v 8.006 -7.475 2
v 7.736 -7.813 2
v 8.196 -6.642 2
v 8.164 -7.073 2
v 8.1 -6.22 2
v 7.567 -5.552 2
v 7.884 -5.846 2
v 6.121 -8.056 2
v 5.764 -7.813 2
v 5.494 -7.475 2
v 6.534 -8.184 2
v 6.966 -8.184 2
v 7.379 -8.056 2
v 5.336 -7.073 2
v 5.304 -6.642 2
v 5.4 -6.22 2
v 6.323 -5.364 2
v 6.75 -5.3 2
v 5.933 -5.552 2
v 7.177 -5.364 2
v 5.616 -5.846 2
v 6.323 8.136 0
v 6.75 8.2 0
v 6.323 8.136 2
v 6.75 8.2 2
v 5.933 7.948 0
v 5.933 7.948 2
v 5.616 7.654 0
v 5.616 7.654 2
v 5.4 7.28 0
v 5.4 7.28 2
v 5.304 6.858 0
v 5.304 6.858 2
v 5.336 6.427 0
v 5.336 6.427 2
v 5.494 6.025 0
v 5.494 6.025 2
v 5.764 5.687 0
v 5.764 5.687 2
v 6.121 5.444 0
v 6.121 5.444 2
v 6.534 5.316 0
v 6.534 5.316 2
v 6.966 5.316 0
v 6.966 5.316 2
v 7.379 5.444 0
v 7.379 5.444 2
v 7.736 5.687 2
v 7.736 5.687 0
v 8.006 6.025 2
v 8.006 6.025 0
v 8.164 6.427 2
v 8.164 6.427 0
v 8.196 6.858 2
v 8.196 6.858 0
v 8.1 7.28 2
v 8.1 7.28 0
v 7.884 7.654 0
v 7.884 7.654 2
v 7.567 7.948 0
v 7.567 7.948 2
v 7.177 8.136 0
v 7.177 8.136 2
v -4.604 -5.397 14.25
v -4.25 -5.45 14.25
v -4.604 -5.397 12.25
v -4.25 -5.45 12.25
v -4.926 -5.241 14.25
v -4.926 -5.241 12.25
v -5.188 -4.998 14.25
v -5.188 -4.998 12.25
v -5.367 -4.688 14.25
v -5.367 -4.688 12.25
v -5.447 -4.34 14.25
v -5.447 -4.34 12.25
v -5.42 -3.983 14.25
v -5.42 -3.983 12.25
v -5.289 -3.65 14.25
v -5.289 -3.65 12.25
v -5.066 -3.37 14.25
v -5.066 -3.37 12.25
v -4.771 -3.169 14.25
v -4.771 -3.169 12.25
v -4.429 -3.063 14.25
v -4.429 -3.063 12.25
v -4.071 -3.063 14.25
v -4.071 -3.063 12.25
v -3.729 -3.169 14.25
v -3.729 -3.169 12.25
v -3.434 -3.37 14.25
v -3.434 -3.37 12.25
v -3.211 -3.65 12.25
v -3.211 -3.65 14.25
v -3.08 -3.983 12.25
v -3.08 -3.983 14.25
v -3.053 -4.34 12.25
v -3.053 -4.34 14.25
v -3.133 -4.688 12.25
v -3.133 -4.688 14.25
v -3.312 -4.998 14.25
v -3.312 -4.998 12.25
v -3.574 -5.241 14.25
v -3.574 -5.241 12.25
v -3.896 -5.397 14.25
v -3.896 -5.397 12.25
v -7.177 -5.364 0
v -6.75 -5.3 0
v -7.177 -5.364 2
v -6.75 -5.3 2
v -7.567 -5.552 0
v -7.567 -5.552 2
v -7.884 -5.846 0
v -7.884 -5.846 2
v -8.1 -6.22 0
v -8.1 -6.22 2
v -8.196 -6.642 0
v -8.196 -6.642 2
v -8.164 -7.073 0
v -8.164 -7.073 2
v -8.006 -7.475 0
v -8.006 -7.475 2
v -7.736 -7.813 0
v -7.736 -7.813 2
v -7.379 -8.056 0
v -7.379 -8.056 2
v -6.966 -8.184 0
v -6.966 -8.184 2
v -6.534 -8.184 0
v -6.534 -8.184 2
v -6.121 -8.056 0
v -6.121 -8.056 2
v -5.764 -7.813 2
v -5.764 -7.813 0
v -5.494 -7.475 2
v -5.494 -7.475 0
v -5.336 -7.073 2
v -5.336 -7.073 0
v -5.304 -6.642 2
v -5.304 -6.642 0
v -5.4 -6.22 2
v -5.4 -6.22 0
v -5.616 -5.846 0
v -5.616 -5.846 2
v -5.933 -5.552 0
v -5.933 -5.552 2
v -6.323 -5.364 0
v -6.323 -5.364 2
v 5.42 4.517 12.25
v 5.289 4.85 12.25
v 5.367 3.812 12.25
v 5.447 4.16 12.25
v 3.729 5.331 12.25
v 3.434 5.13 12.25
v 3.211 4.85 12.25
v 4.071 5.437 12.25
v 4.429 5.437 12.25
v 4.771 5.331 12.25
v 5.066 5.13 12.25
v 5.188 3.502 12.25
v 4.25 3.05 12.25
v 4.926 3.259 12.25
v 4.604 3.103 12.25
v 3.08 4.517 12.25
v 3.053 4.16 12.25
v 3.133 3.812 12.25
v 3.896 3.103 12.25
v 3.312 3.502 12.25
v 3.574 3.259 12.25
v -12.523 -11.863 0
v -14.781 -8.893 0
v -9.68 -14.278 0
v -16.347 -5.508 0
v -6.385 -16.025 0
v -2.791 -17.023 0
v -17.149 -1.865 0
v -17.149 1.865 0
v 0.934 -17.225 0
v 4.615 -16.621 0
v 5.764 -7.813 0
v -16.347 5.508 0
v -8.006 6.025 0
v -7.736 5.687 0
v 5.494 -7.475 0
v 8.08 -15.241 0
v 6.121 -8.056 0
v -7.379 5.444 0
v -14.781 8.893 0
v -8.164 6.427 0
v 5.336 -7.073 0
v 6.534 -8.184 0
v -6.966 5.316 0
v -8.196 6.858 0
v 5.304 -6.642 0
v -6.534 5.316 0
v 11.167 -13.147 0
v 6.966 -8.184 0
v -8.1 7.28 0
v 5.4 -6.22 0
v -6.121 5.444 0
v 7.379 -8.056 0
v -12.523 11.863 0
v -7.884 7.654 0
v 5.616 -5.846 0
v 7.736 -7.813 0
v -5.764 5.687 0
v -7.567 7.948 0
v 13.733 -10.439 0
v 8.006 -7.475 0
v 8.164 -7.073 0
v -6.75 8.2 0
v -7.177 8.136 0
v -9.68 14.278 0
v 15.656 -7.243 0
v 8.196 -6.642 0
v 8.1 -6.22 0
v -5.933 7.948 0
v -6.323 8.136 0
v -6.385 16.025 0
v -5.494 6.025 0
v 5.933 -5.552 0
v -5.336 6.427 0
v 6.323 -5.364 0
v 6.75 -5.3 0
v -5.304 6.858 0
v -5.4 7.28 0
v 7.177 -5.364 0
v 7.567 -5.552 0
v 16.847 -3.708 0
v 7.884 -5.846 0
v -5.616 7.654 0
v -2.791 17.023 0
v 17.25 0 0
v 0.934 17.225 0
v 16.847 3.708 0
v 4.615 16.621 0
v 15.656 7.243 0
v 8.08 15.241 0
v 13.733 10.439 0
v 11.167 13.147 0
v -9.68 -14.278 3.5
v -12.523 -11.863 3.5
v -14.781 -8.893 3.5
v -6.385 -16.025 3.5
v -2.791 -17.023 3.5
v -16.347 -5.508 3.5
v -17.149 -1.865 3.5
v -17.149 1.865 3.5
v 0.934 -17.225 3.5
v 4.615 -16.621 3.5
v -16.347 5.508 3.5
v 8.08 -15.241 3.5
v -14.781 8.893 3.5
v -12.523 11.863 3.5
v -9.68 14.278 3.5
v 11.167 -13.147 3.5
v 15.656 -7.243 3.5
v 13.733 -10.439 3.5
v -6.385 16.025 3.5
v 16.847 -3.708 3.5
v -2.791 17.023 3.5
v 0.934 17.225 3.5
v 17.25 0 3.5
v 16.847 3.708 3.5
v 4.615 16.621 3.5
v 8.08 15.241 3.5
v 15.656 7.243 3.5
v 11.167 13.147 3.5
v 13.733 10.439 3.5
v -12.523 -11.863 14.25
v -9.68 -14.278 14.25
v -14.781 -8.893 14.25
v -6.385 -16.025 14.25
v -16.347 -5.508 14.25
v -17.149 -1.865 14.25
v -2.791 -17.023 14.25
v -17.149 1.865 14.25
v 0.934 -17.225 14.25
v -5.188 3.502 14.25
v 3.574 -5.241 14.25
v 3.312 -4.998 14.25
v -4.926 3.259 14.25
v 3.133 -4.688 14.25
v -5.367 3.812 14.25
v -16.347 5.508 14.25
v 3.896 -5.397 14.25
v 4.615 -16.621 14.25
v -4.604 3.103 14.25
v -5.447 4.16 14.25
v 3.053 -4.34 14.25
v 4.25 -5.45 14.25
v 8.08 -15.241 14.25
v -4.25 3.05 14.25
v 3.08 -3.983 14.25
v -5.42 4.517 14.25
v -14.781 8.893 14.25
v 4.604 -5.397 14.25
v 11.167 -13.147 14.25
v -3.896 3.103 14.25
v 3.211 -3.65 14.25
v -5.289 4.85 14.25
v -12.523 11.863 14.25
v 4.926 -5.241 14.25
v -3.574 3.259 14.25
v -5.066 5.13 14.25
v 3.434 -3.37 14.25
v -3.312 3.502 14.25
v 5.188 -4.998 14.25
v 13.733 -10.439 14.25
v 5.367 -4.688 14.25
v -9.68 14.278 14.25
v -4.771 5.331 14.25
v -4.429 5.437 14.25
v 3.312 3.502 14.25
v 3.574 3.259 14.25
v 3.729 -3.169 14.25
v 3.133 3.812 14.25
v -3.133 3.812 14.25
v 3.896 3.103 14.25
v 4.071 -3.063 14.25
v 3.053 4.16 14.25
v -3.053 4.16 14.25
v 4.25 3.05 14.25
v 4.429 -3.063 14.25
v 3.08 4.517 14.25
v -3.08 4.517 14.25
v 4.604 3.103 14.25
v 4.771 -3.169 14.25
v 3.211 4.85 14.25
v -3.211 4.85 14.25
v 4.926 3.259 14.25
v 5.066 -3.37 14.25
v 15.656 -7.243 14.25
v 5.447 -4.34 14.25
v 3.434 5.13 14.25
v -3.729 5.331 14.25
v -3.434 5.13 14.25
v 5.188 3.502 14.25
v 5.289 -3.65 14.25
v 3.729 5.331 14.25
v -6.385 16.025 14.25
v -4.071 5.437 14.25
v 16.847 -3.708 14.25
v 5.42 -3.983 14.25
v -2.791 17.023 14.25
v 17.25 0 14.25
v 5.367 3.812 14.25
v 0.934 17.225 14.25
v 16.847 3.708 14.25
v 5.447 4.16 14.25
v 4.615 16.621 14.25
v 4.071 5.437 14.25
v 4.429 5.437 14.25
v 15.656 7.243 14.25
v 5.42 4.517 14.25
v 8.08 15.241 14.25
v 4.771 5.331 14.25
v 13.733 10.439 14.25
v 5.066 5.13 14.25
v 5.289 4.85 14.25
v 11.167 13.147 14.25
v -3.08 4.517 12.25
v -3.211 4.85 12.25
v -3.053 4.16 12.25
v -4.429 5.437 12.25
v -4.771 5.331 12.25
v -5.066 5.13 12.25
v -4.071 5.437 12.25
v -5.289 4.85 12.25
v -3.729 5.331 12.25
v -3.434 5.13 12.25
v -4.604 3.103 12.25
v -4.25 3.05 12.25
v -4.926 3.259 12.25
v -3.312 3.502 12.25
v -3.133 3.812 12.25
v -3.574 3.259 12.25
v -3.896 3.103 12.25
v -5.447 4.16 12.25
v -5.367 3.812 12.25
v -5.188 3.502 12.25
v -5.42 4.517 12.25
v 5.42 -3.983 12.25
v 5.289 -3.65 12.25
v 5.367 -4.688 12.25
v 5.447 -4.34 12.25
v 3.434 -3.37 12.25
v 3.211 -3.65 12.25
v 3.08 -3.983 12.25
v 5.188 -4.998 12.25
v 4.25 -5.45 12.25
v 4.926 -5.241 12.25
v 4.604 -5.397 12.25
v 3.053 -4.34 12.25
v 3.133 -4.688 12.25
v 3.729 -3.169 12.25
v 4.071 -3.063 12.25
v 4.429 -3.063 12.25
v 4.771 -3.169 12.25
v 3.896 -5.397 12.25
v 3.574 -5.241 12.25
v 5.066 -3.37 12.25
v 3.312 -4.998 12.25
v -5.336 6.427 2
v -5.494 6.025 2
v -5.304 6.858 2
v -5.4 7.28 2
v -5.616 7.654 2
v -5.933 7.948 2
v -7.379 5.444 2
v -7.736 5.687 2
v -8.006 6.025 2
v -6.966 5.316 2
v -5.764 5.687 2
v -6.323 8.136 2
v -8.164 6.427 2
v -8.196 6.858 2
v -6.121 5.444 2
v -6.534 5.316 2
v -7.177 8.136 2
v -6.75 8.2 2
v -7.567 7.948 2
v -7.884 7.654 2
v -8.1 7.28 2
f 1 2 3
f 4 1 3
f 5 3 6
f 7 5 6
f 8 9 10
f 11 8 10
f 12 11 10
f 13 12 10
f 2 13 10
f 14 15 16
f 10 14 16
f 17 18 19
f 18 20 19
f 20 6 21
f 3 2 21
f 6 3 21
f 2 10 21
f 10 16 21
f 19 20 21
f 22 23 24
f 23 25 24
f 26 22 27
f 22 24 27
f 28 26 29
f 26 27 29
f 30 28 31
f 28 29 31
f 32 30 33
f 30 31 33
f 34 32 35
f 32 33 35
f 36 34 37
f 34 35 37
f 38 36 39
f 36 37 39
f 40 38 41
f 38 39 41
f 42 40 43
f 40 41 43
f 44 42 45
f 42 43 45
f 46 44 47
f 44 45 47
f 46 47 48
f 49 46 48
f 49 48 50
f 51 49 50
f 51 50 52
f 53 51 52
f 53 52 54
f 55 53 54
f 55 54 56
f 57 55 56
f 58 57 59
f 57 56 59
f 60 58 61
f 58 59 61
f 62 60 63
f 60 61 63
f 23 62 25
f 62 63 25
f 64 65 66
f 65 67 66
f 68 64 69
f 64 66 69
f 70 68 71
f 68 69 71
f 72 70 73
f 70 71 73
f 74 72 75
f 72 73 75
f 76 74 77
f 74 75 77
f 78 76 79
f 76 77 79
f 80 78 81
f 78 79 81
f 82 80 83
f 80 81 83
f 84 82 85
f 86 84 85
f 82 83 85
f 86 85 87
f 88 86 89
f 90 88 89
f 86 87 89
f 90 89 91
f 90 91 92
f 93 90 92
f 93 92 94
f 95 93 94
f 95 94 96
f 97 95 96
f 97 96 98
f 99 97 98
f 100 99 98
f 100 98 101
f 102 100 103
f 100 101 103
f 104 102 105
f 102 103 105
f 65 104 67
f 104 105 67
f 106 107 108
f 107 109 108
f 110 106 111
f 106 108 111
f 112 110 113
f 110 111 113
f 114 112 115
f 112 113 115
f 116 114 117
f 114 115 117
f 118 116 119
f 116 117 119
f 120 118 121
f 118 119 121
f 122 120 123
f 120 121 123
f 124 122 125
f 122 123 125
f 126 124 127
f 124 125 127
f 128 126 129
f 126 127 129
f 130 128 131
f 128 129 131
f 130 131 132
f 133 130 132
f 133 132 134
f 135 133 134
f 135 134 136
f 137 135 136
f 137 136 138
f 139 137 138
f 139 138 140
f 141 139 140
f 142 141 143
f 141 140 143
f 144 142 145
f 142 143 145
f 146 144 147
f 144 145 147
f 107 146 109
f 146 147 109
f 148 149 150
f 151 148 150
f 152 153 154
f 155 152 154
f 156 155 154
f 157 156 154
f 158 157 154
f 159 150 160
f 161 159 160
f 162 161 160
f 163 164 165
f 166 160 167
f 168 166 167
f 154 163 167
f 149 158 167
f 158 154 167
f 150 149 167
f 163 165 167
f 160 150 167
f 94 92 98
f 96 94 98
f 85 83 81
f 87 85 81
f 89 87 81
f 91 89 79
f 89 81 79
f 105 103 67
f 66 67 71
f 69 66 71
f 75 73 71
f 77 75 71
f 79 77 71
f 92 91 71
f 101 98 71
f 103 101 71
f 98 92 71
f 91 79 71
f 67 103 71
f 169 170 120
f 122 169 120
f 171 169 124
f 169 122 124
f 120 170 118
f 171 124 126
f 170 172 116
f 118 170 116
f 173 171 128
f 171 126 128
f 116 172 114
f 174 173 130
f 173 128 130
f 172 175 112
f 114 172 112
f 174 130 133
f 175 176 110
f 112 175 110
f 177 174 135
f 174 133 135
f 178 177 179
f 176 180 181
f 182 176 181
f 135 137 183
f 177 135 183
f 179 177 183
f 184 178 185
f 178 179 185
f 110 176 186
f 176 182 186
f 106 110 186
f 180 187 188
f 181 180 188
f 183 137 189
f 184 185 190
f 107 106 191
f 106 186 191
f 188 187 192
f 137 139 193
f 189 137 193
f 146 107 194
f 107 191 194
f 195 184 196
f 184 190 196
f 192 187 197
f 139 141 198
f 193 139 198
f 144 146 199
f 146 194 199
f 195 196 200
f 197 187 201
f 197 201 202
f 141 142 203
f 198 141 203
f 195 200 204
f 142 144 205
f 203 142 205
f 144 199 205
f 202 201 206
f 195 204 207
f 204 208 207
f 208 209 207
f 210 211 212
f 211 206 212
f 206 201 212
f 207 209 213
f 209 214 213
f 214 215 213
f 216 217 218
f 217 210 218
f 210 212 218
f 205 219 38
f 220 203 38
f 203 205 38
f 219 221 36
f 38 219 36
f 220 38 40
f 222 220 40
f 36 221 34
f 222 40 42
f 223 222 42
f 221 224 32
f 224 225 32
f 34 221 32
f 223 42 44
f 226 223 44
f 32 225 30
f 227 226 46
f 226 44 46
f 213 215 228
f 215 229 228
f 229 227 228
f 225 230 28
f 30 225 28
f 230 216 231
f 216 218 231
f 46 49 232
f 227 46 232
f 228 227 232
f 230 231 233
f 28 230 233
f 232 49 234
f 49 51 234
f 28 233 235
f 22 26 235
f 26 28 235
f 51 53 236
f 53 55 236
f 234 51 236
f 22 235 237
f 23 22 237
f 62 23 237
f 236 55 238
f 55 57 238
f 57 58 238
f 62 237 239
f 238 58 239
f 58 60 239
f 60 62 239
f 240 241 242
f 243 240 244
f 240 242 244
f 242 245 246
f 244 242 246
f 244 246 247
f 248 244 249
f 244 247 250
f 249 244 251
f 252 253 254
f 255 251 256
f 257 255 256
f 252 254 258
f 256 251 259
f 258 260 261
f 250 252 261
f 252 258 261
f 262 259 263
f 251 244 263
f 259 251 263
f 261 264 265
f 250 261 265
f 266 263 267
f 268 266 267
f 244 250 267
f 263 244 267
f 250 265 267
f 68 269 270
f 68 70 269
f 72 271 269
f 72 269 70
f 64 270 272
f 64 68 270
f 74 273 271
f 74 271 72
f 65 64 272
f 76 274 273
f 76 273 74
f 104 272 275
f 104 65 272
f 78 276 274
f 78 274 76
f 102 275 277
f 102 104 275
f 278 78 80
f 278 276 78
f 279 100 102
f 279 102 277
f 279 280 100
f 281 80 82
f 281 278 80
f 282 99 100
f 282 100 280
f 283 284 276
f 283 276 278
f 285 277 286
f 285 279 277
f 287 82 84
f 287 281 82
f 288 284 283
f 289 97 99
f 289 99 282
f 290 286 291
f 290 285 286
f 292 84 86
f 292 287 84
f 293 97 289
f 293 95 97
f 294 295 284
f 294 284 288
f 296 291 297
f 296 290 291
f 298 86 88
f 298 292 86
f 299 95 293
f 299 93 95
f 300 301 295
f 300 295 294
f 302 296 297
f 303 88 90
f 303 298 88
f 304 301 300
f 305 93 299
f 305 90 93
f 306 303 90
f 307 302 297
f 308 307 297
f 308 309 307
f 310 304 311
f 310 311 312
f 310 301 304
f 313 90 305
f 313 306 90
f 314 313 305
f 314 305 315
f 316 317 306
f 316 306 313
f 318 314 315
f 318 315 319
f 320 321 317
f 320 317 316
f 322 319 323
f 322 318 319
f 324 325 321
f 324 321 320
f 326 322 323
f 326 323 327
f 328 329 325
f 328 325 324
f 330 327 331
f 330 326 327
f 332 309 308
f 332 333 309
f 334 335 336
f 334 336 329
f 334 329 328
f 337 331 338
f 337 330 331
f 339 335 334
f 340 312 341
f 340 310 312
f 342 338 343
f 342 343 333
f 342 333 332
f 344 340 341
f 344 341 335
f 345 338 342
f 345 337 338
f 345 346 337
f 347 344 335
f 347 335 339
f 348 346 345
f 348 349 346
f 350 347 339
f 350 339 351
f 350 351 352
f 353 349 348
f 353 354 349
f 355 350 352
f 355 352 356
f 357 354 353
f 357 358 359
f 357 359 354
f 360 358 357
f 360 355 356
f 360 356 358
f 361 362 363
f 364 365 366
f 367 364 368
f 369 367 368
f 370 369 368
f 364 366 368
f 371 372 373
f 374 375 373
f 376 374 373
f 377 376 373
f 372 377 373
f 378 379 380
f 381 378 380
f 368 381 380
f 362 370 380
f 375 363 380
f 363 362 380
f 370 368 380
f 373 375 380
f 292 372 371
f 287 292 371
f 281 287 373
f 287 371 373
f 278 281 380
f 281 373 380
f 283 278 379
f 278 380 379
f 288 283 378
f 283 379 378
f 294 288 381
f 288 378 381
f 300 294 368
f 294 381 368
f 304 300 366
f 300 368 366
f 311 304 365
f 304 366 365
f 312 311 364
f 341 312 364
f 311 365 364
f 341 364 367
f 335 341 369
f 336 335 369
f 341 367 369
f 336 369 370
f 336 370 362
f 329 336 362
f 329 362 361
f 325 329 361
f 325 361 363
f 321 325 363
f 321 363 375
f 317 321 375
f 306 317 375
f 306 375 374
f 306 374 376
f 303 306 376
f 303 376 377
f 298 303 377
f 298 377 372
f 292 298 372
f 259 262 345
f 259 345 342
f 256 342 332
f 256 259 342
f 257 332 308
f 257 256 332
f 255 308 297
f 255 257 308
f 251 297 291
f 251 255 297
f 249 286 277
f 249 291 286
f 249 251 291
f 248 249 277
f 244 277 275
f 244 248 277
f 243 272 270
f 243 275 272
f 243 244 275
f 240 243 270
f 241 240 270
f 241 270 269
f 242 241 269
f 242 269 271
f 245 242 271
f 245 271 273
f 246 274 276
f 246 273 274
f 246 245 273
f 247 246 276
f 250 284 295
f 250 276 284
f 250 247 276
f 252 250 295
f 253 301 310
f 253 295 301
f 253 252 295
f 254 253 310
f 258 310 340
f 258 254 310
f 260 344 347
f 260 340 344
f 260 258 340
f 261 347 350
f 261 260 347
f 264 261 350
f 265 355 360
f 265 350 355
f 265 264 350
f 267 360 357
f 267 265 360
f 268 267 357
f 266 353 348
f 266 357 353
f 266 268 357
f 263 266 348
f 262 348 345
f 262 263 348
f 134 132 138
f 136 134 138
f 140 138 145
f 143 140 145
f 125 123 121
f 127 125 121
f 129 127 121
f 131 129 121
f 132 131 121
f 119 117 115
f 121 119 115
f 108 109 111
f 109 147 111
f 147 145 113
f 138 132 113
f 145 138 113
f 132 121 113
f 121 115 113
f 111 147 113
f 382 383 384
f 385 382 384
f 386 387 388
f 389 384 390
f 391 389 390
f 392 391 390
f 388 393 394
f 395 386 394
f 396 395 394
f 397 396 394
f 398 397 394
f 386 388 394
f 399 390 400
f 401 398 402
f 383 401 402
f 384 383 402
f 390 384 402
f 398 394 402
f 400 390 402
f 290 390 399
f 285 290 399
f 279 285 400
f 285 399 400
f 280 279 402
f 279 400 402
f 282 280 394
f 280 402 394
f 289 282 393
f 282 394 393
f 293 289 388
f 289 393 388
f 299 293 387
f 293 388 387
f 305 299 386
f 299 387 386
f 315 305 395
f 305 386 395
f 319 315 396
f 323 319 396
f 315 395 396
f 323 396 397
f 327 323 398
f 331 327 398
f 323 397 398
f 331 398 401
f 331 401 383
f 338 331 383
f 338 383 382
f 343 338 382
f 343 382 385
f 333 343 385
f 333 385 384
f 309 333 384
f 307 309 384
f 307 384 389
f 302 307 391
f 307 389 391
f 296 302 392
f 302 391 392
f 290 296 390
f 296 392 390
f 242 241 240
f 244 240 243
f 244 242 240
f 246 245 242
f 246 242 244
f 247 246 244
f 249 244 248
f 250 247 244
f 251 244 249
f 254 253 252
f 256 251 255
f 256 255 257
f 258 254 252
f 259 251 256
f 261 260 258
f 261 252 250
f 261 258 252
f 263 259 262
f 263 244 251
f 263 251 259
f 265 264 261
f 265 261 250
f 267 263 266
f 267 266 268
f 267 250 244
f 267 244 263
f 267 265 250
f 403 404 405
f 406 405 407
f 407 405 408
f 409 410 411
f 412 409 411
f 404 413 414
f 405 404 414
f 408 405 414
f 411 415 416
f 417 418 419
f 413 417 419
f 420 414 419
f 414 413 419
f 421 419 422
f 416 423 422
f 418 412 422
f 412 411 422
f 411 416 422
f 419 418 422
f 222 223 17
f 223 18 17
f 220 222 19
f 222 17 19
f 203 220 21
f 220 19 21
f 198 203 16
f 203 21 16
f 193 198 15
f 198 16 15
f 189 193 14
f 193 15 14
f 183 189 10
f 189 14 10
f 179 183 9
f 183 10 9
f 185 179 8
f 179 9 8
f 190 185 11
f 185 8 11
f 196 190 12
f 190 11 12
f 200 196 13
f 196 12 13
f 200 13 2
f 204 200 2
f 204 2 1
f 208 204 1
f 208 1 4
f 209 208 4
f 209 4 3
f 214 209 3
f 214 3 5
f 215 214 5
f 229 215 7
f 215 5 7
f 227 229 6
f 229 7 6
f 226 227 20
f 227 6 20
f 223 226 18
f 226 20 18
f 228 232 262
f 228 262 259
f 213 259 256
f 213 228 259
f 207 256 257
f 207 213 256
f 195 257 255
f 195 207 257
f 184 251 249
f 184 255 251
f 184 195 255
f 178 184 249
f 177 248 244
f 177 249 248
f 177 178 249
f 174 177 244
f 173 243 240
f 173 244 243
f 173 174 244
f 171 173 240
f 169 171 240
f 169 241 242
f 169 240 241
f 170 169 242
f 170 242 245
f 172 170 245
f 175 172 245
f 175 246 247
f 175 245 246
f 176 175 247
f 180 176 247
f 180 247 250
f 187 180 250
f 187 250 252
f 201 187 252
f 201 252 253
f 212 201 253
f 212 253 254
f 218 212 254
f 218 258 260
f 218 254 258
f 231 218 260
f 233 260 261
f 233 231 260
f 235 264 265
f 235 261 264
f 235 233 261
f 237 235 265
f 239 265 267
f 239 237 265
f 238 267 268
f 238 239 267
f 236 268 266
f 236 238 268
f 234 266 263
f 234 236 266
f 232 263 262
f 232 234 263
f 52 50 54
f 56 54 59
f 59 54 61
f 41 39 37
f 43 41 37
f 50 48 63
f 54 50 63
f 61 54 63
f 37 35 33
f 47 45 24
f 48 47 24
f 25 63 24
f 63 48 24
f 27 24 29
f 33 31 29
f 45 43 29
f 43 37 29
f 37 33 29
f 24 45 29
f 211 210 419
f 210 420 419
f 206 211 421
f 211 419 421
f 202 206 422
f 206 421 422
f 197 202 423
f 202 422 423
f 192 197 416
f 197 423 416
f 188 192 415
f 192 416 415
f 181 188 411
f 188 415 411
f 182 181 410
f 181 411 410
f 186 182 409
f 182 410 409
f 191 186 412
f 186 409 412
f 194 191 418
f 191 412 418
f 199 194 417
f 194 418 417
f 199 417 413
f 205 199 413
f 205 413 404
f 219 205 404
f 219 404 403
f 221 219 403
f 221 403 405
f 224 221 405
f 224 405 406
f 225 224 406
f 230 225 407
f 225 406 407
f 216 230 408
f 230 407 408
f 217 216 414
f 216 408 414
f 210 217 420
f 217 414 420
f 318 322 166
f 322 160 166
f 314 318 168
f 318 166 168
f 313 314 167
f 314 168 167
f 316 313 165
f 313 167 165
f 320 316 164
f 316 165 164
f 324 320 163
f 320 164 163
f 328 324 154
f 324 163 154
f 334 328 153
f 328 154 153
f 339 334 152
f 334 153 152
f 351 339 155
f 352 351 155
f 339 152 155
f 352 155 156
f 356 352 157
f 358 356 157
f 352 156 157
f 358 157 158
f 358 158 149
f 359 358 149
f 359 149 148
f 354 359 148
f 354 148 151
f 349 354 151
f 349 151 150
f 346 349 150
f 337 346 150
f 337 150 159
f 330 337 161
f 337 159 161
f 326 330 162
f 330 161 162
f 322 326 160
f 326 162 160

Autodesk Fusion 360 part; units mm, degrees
sketch "Sketch1" plane through (0, 0, 0) normal (0, 0, 1) x (1, 0, 0)
  circle A0 centre (0, 0) radius 17.25
  line L0 (6.75, -6.75) -> (-6.75, -6.75) construction
  line L1 (-6.75, -6.75) -> (-6.75, 6.75) construction
  line L2 (-6.75, 6.75) -> (6.75, 6.75) construction
  line L3 (6.75, 6.75) -> (6.75, -6.75) construction
  line L4 (6.75, -6.75) -> (-6.75, 6.75) construction
  line L5 (-6.75, -6.75) -> (6.75, 6.75) construction
  dimension "d1" = 34.5
  dimension "d2" = 13.5
extrude "Extrude1" add sketch "Sketch1" along normal blind 3.5 makes body 1
extrude "Extrude2" add 1 faces at (4.4063, 6.4628, 3.5) along direction (0, 0, 1) blind 10.75 separate body on bodies 1 makes body 2
hole "Hole1" at (-6.75, -6.75, 0) at (6.75, -6.75, 0) at (6.75, 6.75, 0) at (-6.75, 6.75, 0) direction (0, 0, 1) diameter 2.9 depth 2 tip angle 180 bodies 1
sketch "Sketch2" plane through (0, 0, 14.25) normal (0, 0, 1) x (-1, 0, 0)
  circle A0 centre (0, 0) radius 17.25
  line L0 (-4.25, 4.25) -> (4.25, 4.25) construction
  line L1 (4.25, 4.25) -> (4.25, -4.25) construction
  line L2 (4.25, -4.25) -> (-4.25, -4.25) construction
  line L3 (-4.25, -4.25) -> (-4.25, 4.25) construction
  line L4 (-4.25, 4.25) -> (4.25, -4.25) construction
  line L5 (4.25, 4.25) -> (-4.25, -4.25) construction
  dimension "d11" = 8.5
hole "Hole2" at (-4.25, 4.25, 14.25) at (4.25, 4.25, 14.25) at (4.25, -4.25, 14.25) at (-4.25, -4.25, 14.25) direction (0, 0, -1) diameter 2.4 depth 2 tip angle 180 bodies 2
copy_body "Body->Comp1" bodies 1 removing the originals makes body 3 in component "Bottom"
copy_body "Body->Comp2" bodies 2 removing the originals makes body 4 in component "Top"
component "Bottom" placed x (1, 0, 0) y (0, 1, 0) z (0, 0, 1) at (0, 0, 0)
component "Top" placed x (1, 0, 0) y (0, 1, 0) z (0, 0, 1) at (0, 0, 0)
equation "d3 = 3.5 mm"
equation "d8 = 14.25 mm - d3"
